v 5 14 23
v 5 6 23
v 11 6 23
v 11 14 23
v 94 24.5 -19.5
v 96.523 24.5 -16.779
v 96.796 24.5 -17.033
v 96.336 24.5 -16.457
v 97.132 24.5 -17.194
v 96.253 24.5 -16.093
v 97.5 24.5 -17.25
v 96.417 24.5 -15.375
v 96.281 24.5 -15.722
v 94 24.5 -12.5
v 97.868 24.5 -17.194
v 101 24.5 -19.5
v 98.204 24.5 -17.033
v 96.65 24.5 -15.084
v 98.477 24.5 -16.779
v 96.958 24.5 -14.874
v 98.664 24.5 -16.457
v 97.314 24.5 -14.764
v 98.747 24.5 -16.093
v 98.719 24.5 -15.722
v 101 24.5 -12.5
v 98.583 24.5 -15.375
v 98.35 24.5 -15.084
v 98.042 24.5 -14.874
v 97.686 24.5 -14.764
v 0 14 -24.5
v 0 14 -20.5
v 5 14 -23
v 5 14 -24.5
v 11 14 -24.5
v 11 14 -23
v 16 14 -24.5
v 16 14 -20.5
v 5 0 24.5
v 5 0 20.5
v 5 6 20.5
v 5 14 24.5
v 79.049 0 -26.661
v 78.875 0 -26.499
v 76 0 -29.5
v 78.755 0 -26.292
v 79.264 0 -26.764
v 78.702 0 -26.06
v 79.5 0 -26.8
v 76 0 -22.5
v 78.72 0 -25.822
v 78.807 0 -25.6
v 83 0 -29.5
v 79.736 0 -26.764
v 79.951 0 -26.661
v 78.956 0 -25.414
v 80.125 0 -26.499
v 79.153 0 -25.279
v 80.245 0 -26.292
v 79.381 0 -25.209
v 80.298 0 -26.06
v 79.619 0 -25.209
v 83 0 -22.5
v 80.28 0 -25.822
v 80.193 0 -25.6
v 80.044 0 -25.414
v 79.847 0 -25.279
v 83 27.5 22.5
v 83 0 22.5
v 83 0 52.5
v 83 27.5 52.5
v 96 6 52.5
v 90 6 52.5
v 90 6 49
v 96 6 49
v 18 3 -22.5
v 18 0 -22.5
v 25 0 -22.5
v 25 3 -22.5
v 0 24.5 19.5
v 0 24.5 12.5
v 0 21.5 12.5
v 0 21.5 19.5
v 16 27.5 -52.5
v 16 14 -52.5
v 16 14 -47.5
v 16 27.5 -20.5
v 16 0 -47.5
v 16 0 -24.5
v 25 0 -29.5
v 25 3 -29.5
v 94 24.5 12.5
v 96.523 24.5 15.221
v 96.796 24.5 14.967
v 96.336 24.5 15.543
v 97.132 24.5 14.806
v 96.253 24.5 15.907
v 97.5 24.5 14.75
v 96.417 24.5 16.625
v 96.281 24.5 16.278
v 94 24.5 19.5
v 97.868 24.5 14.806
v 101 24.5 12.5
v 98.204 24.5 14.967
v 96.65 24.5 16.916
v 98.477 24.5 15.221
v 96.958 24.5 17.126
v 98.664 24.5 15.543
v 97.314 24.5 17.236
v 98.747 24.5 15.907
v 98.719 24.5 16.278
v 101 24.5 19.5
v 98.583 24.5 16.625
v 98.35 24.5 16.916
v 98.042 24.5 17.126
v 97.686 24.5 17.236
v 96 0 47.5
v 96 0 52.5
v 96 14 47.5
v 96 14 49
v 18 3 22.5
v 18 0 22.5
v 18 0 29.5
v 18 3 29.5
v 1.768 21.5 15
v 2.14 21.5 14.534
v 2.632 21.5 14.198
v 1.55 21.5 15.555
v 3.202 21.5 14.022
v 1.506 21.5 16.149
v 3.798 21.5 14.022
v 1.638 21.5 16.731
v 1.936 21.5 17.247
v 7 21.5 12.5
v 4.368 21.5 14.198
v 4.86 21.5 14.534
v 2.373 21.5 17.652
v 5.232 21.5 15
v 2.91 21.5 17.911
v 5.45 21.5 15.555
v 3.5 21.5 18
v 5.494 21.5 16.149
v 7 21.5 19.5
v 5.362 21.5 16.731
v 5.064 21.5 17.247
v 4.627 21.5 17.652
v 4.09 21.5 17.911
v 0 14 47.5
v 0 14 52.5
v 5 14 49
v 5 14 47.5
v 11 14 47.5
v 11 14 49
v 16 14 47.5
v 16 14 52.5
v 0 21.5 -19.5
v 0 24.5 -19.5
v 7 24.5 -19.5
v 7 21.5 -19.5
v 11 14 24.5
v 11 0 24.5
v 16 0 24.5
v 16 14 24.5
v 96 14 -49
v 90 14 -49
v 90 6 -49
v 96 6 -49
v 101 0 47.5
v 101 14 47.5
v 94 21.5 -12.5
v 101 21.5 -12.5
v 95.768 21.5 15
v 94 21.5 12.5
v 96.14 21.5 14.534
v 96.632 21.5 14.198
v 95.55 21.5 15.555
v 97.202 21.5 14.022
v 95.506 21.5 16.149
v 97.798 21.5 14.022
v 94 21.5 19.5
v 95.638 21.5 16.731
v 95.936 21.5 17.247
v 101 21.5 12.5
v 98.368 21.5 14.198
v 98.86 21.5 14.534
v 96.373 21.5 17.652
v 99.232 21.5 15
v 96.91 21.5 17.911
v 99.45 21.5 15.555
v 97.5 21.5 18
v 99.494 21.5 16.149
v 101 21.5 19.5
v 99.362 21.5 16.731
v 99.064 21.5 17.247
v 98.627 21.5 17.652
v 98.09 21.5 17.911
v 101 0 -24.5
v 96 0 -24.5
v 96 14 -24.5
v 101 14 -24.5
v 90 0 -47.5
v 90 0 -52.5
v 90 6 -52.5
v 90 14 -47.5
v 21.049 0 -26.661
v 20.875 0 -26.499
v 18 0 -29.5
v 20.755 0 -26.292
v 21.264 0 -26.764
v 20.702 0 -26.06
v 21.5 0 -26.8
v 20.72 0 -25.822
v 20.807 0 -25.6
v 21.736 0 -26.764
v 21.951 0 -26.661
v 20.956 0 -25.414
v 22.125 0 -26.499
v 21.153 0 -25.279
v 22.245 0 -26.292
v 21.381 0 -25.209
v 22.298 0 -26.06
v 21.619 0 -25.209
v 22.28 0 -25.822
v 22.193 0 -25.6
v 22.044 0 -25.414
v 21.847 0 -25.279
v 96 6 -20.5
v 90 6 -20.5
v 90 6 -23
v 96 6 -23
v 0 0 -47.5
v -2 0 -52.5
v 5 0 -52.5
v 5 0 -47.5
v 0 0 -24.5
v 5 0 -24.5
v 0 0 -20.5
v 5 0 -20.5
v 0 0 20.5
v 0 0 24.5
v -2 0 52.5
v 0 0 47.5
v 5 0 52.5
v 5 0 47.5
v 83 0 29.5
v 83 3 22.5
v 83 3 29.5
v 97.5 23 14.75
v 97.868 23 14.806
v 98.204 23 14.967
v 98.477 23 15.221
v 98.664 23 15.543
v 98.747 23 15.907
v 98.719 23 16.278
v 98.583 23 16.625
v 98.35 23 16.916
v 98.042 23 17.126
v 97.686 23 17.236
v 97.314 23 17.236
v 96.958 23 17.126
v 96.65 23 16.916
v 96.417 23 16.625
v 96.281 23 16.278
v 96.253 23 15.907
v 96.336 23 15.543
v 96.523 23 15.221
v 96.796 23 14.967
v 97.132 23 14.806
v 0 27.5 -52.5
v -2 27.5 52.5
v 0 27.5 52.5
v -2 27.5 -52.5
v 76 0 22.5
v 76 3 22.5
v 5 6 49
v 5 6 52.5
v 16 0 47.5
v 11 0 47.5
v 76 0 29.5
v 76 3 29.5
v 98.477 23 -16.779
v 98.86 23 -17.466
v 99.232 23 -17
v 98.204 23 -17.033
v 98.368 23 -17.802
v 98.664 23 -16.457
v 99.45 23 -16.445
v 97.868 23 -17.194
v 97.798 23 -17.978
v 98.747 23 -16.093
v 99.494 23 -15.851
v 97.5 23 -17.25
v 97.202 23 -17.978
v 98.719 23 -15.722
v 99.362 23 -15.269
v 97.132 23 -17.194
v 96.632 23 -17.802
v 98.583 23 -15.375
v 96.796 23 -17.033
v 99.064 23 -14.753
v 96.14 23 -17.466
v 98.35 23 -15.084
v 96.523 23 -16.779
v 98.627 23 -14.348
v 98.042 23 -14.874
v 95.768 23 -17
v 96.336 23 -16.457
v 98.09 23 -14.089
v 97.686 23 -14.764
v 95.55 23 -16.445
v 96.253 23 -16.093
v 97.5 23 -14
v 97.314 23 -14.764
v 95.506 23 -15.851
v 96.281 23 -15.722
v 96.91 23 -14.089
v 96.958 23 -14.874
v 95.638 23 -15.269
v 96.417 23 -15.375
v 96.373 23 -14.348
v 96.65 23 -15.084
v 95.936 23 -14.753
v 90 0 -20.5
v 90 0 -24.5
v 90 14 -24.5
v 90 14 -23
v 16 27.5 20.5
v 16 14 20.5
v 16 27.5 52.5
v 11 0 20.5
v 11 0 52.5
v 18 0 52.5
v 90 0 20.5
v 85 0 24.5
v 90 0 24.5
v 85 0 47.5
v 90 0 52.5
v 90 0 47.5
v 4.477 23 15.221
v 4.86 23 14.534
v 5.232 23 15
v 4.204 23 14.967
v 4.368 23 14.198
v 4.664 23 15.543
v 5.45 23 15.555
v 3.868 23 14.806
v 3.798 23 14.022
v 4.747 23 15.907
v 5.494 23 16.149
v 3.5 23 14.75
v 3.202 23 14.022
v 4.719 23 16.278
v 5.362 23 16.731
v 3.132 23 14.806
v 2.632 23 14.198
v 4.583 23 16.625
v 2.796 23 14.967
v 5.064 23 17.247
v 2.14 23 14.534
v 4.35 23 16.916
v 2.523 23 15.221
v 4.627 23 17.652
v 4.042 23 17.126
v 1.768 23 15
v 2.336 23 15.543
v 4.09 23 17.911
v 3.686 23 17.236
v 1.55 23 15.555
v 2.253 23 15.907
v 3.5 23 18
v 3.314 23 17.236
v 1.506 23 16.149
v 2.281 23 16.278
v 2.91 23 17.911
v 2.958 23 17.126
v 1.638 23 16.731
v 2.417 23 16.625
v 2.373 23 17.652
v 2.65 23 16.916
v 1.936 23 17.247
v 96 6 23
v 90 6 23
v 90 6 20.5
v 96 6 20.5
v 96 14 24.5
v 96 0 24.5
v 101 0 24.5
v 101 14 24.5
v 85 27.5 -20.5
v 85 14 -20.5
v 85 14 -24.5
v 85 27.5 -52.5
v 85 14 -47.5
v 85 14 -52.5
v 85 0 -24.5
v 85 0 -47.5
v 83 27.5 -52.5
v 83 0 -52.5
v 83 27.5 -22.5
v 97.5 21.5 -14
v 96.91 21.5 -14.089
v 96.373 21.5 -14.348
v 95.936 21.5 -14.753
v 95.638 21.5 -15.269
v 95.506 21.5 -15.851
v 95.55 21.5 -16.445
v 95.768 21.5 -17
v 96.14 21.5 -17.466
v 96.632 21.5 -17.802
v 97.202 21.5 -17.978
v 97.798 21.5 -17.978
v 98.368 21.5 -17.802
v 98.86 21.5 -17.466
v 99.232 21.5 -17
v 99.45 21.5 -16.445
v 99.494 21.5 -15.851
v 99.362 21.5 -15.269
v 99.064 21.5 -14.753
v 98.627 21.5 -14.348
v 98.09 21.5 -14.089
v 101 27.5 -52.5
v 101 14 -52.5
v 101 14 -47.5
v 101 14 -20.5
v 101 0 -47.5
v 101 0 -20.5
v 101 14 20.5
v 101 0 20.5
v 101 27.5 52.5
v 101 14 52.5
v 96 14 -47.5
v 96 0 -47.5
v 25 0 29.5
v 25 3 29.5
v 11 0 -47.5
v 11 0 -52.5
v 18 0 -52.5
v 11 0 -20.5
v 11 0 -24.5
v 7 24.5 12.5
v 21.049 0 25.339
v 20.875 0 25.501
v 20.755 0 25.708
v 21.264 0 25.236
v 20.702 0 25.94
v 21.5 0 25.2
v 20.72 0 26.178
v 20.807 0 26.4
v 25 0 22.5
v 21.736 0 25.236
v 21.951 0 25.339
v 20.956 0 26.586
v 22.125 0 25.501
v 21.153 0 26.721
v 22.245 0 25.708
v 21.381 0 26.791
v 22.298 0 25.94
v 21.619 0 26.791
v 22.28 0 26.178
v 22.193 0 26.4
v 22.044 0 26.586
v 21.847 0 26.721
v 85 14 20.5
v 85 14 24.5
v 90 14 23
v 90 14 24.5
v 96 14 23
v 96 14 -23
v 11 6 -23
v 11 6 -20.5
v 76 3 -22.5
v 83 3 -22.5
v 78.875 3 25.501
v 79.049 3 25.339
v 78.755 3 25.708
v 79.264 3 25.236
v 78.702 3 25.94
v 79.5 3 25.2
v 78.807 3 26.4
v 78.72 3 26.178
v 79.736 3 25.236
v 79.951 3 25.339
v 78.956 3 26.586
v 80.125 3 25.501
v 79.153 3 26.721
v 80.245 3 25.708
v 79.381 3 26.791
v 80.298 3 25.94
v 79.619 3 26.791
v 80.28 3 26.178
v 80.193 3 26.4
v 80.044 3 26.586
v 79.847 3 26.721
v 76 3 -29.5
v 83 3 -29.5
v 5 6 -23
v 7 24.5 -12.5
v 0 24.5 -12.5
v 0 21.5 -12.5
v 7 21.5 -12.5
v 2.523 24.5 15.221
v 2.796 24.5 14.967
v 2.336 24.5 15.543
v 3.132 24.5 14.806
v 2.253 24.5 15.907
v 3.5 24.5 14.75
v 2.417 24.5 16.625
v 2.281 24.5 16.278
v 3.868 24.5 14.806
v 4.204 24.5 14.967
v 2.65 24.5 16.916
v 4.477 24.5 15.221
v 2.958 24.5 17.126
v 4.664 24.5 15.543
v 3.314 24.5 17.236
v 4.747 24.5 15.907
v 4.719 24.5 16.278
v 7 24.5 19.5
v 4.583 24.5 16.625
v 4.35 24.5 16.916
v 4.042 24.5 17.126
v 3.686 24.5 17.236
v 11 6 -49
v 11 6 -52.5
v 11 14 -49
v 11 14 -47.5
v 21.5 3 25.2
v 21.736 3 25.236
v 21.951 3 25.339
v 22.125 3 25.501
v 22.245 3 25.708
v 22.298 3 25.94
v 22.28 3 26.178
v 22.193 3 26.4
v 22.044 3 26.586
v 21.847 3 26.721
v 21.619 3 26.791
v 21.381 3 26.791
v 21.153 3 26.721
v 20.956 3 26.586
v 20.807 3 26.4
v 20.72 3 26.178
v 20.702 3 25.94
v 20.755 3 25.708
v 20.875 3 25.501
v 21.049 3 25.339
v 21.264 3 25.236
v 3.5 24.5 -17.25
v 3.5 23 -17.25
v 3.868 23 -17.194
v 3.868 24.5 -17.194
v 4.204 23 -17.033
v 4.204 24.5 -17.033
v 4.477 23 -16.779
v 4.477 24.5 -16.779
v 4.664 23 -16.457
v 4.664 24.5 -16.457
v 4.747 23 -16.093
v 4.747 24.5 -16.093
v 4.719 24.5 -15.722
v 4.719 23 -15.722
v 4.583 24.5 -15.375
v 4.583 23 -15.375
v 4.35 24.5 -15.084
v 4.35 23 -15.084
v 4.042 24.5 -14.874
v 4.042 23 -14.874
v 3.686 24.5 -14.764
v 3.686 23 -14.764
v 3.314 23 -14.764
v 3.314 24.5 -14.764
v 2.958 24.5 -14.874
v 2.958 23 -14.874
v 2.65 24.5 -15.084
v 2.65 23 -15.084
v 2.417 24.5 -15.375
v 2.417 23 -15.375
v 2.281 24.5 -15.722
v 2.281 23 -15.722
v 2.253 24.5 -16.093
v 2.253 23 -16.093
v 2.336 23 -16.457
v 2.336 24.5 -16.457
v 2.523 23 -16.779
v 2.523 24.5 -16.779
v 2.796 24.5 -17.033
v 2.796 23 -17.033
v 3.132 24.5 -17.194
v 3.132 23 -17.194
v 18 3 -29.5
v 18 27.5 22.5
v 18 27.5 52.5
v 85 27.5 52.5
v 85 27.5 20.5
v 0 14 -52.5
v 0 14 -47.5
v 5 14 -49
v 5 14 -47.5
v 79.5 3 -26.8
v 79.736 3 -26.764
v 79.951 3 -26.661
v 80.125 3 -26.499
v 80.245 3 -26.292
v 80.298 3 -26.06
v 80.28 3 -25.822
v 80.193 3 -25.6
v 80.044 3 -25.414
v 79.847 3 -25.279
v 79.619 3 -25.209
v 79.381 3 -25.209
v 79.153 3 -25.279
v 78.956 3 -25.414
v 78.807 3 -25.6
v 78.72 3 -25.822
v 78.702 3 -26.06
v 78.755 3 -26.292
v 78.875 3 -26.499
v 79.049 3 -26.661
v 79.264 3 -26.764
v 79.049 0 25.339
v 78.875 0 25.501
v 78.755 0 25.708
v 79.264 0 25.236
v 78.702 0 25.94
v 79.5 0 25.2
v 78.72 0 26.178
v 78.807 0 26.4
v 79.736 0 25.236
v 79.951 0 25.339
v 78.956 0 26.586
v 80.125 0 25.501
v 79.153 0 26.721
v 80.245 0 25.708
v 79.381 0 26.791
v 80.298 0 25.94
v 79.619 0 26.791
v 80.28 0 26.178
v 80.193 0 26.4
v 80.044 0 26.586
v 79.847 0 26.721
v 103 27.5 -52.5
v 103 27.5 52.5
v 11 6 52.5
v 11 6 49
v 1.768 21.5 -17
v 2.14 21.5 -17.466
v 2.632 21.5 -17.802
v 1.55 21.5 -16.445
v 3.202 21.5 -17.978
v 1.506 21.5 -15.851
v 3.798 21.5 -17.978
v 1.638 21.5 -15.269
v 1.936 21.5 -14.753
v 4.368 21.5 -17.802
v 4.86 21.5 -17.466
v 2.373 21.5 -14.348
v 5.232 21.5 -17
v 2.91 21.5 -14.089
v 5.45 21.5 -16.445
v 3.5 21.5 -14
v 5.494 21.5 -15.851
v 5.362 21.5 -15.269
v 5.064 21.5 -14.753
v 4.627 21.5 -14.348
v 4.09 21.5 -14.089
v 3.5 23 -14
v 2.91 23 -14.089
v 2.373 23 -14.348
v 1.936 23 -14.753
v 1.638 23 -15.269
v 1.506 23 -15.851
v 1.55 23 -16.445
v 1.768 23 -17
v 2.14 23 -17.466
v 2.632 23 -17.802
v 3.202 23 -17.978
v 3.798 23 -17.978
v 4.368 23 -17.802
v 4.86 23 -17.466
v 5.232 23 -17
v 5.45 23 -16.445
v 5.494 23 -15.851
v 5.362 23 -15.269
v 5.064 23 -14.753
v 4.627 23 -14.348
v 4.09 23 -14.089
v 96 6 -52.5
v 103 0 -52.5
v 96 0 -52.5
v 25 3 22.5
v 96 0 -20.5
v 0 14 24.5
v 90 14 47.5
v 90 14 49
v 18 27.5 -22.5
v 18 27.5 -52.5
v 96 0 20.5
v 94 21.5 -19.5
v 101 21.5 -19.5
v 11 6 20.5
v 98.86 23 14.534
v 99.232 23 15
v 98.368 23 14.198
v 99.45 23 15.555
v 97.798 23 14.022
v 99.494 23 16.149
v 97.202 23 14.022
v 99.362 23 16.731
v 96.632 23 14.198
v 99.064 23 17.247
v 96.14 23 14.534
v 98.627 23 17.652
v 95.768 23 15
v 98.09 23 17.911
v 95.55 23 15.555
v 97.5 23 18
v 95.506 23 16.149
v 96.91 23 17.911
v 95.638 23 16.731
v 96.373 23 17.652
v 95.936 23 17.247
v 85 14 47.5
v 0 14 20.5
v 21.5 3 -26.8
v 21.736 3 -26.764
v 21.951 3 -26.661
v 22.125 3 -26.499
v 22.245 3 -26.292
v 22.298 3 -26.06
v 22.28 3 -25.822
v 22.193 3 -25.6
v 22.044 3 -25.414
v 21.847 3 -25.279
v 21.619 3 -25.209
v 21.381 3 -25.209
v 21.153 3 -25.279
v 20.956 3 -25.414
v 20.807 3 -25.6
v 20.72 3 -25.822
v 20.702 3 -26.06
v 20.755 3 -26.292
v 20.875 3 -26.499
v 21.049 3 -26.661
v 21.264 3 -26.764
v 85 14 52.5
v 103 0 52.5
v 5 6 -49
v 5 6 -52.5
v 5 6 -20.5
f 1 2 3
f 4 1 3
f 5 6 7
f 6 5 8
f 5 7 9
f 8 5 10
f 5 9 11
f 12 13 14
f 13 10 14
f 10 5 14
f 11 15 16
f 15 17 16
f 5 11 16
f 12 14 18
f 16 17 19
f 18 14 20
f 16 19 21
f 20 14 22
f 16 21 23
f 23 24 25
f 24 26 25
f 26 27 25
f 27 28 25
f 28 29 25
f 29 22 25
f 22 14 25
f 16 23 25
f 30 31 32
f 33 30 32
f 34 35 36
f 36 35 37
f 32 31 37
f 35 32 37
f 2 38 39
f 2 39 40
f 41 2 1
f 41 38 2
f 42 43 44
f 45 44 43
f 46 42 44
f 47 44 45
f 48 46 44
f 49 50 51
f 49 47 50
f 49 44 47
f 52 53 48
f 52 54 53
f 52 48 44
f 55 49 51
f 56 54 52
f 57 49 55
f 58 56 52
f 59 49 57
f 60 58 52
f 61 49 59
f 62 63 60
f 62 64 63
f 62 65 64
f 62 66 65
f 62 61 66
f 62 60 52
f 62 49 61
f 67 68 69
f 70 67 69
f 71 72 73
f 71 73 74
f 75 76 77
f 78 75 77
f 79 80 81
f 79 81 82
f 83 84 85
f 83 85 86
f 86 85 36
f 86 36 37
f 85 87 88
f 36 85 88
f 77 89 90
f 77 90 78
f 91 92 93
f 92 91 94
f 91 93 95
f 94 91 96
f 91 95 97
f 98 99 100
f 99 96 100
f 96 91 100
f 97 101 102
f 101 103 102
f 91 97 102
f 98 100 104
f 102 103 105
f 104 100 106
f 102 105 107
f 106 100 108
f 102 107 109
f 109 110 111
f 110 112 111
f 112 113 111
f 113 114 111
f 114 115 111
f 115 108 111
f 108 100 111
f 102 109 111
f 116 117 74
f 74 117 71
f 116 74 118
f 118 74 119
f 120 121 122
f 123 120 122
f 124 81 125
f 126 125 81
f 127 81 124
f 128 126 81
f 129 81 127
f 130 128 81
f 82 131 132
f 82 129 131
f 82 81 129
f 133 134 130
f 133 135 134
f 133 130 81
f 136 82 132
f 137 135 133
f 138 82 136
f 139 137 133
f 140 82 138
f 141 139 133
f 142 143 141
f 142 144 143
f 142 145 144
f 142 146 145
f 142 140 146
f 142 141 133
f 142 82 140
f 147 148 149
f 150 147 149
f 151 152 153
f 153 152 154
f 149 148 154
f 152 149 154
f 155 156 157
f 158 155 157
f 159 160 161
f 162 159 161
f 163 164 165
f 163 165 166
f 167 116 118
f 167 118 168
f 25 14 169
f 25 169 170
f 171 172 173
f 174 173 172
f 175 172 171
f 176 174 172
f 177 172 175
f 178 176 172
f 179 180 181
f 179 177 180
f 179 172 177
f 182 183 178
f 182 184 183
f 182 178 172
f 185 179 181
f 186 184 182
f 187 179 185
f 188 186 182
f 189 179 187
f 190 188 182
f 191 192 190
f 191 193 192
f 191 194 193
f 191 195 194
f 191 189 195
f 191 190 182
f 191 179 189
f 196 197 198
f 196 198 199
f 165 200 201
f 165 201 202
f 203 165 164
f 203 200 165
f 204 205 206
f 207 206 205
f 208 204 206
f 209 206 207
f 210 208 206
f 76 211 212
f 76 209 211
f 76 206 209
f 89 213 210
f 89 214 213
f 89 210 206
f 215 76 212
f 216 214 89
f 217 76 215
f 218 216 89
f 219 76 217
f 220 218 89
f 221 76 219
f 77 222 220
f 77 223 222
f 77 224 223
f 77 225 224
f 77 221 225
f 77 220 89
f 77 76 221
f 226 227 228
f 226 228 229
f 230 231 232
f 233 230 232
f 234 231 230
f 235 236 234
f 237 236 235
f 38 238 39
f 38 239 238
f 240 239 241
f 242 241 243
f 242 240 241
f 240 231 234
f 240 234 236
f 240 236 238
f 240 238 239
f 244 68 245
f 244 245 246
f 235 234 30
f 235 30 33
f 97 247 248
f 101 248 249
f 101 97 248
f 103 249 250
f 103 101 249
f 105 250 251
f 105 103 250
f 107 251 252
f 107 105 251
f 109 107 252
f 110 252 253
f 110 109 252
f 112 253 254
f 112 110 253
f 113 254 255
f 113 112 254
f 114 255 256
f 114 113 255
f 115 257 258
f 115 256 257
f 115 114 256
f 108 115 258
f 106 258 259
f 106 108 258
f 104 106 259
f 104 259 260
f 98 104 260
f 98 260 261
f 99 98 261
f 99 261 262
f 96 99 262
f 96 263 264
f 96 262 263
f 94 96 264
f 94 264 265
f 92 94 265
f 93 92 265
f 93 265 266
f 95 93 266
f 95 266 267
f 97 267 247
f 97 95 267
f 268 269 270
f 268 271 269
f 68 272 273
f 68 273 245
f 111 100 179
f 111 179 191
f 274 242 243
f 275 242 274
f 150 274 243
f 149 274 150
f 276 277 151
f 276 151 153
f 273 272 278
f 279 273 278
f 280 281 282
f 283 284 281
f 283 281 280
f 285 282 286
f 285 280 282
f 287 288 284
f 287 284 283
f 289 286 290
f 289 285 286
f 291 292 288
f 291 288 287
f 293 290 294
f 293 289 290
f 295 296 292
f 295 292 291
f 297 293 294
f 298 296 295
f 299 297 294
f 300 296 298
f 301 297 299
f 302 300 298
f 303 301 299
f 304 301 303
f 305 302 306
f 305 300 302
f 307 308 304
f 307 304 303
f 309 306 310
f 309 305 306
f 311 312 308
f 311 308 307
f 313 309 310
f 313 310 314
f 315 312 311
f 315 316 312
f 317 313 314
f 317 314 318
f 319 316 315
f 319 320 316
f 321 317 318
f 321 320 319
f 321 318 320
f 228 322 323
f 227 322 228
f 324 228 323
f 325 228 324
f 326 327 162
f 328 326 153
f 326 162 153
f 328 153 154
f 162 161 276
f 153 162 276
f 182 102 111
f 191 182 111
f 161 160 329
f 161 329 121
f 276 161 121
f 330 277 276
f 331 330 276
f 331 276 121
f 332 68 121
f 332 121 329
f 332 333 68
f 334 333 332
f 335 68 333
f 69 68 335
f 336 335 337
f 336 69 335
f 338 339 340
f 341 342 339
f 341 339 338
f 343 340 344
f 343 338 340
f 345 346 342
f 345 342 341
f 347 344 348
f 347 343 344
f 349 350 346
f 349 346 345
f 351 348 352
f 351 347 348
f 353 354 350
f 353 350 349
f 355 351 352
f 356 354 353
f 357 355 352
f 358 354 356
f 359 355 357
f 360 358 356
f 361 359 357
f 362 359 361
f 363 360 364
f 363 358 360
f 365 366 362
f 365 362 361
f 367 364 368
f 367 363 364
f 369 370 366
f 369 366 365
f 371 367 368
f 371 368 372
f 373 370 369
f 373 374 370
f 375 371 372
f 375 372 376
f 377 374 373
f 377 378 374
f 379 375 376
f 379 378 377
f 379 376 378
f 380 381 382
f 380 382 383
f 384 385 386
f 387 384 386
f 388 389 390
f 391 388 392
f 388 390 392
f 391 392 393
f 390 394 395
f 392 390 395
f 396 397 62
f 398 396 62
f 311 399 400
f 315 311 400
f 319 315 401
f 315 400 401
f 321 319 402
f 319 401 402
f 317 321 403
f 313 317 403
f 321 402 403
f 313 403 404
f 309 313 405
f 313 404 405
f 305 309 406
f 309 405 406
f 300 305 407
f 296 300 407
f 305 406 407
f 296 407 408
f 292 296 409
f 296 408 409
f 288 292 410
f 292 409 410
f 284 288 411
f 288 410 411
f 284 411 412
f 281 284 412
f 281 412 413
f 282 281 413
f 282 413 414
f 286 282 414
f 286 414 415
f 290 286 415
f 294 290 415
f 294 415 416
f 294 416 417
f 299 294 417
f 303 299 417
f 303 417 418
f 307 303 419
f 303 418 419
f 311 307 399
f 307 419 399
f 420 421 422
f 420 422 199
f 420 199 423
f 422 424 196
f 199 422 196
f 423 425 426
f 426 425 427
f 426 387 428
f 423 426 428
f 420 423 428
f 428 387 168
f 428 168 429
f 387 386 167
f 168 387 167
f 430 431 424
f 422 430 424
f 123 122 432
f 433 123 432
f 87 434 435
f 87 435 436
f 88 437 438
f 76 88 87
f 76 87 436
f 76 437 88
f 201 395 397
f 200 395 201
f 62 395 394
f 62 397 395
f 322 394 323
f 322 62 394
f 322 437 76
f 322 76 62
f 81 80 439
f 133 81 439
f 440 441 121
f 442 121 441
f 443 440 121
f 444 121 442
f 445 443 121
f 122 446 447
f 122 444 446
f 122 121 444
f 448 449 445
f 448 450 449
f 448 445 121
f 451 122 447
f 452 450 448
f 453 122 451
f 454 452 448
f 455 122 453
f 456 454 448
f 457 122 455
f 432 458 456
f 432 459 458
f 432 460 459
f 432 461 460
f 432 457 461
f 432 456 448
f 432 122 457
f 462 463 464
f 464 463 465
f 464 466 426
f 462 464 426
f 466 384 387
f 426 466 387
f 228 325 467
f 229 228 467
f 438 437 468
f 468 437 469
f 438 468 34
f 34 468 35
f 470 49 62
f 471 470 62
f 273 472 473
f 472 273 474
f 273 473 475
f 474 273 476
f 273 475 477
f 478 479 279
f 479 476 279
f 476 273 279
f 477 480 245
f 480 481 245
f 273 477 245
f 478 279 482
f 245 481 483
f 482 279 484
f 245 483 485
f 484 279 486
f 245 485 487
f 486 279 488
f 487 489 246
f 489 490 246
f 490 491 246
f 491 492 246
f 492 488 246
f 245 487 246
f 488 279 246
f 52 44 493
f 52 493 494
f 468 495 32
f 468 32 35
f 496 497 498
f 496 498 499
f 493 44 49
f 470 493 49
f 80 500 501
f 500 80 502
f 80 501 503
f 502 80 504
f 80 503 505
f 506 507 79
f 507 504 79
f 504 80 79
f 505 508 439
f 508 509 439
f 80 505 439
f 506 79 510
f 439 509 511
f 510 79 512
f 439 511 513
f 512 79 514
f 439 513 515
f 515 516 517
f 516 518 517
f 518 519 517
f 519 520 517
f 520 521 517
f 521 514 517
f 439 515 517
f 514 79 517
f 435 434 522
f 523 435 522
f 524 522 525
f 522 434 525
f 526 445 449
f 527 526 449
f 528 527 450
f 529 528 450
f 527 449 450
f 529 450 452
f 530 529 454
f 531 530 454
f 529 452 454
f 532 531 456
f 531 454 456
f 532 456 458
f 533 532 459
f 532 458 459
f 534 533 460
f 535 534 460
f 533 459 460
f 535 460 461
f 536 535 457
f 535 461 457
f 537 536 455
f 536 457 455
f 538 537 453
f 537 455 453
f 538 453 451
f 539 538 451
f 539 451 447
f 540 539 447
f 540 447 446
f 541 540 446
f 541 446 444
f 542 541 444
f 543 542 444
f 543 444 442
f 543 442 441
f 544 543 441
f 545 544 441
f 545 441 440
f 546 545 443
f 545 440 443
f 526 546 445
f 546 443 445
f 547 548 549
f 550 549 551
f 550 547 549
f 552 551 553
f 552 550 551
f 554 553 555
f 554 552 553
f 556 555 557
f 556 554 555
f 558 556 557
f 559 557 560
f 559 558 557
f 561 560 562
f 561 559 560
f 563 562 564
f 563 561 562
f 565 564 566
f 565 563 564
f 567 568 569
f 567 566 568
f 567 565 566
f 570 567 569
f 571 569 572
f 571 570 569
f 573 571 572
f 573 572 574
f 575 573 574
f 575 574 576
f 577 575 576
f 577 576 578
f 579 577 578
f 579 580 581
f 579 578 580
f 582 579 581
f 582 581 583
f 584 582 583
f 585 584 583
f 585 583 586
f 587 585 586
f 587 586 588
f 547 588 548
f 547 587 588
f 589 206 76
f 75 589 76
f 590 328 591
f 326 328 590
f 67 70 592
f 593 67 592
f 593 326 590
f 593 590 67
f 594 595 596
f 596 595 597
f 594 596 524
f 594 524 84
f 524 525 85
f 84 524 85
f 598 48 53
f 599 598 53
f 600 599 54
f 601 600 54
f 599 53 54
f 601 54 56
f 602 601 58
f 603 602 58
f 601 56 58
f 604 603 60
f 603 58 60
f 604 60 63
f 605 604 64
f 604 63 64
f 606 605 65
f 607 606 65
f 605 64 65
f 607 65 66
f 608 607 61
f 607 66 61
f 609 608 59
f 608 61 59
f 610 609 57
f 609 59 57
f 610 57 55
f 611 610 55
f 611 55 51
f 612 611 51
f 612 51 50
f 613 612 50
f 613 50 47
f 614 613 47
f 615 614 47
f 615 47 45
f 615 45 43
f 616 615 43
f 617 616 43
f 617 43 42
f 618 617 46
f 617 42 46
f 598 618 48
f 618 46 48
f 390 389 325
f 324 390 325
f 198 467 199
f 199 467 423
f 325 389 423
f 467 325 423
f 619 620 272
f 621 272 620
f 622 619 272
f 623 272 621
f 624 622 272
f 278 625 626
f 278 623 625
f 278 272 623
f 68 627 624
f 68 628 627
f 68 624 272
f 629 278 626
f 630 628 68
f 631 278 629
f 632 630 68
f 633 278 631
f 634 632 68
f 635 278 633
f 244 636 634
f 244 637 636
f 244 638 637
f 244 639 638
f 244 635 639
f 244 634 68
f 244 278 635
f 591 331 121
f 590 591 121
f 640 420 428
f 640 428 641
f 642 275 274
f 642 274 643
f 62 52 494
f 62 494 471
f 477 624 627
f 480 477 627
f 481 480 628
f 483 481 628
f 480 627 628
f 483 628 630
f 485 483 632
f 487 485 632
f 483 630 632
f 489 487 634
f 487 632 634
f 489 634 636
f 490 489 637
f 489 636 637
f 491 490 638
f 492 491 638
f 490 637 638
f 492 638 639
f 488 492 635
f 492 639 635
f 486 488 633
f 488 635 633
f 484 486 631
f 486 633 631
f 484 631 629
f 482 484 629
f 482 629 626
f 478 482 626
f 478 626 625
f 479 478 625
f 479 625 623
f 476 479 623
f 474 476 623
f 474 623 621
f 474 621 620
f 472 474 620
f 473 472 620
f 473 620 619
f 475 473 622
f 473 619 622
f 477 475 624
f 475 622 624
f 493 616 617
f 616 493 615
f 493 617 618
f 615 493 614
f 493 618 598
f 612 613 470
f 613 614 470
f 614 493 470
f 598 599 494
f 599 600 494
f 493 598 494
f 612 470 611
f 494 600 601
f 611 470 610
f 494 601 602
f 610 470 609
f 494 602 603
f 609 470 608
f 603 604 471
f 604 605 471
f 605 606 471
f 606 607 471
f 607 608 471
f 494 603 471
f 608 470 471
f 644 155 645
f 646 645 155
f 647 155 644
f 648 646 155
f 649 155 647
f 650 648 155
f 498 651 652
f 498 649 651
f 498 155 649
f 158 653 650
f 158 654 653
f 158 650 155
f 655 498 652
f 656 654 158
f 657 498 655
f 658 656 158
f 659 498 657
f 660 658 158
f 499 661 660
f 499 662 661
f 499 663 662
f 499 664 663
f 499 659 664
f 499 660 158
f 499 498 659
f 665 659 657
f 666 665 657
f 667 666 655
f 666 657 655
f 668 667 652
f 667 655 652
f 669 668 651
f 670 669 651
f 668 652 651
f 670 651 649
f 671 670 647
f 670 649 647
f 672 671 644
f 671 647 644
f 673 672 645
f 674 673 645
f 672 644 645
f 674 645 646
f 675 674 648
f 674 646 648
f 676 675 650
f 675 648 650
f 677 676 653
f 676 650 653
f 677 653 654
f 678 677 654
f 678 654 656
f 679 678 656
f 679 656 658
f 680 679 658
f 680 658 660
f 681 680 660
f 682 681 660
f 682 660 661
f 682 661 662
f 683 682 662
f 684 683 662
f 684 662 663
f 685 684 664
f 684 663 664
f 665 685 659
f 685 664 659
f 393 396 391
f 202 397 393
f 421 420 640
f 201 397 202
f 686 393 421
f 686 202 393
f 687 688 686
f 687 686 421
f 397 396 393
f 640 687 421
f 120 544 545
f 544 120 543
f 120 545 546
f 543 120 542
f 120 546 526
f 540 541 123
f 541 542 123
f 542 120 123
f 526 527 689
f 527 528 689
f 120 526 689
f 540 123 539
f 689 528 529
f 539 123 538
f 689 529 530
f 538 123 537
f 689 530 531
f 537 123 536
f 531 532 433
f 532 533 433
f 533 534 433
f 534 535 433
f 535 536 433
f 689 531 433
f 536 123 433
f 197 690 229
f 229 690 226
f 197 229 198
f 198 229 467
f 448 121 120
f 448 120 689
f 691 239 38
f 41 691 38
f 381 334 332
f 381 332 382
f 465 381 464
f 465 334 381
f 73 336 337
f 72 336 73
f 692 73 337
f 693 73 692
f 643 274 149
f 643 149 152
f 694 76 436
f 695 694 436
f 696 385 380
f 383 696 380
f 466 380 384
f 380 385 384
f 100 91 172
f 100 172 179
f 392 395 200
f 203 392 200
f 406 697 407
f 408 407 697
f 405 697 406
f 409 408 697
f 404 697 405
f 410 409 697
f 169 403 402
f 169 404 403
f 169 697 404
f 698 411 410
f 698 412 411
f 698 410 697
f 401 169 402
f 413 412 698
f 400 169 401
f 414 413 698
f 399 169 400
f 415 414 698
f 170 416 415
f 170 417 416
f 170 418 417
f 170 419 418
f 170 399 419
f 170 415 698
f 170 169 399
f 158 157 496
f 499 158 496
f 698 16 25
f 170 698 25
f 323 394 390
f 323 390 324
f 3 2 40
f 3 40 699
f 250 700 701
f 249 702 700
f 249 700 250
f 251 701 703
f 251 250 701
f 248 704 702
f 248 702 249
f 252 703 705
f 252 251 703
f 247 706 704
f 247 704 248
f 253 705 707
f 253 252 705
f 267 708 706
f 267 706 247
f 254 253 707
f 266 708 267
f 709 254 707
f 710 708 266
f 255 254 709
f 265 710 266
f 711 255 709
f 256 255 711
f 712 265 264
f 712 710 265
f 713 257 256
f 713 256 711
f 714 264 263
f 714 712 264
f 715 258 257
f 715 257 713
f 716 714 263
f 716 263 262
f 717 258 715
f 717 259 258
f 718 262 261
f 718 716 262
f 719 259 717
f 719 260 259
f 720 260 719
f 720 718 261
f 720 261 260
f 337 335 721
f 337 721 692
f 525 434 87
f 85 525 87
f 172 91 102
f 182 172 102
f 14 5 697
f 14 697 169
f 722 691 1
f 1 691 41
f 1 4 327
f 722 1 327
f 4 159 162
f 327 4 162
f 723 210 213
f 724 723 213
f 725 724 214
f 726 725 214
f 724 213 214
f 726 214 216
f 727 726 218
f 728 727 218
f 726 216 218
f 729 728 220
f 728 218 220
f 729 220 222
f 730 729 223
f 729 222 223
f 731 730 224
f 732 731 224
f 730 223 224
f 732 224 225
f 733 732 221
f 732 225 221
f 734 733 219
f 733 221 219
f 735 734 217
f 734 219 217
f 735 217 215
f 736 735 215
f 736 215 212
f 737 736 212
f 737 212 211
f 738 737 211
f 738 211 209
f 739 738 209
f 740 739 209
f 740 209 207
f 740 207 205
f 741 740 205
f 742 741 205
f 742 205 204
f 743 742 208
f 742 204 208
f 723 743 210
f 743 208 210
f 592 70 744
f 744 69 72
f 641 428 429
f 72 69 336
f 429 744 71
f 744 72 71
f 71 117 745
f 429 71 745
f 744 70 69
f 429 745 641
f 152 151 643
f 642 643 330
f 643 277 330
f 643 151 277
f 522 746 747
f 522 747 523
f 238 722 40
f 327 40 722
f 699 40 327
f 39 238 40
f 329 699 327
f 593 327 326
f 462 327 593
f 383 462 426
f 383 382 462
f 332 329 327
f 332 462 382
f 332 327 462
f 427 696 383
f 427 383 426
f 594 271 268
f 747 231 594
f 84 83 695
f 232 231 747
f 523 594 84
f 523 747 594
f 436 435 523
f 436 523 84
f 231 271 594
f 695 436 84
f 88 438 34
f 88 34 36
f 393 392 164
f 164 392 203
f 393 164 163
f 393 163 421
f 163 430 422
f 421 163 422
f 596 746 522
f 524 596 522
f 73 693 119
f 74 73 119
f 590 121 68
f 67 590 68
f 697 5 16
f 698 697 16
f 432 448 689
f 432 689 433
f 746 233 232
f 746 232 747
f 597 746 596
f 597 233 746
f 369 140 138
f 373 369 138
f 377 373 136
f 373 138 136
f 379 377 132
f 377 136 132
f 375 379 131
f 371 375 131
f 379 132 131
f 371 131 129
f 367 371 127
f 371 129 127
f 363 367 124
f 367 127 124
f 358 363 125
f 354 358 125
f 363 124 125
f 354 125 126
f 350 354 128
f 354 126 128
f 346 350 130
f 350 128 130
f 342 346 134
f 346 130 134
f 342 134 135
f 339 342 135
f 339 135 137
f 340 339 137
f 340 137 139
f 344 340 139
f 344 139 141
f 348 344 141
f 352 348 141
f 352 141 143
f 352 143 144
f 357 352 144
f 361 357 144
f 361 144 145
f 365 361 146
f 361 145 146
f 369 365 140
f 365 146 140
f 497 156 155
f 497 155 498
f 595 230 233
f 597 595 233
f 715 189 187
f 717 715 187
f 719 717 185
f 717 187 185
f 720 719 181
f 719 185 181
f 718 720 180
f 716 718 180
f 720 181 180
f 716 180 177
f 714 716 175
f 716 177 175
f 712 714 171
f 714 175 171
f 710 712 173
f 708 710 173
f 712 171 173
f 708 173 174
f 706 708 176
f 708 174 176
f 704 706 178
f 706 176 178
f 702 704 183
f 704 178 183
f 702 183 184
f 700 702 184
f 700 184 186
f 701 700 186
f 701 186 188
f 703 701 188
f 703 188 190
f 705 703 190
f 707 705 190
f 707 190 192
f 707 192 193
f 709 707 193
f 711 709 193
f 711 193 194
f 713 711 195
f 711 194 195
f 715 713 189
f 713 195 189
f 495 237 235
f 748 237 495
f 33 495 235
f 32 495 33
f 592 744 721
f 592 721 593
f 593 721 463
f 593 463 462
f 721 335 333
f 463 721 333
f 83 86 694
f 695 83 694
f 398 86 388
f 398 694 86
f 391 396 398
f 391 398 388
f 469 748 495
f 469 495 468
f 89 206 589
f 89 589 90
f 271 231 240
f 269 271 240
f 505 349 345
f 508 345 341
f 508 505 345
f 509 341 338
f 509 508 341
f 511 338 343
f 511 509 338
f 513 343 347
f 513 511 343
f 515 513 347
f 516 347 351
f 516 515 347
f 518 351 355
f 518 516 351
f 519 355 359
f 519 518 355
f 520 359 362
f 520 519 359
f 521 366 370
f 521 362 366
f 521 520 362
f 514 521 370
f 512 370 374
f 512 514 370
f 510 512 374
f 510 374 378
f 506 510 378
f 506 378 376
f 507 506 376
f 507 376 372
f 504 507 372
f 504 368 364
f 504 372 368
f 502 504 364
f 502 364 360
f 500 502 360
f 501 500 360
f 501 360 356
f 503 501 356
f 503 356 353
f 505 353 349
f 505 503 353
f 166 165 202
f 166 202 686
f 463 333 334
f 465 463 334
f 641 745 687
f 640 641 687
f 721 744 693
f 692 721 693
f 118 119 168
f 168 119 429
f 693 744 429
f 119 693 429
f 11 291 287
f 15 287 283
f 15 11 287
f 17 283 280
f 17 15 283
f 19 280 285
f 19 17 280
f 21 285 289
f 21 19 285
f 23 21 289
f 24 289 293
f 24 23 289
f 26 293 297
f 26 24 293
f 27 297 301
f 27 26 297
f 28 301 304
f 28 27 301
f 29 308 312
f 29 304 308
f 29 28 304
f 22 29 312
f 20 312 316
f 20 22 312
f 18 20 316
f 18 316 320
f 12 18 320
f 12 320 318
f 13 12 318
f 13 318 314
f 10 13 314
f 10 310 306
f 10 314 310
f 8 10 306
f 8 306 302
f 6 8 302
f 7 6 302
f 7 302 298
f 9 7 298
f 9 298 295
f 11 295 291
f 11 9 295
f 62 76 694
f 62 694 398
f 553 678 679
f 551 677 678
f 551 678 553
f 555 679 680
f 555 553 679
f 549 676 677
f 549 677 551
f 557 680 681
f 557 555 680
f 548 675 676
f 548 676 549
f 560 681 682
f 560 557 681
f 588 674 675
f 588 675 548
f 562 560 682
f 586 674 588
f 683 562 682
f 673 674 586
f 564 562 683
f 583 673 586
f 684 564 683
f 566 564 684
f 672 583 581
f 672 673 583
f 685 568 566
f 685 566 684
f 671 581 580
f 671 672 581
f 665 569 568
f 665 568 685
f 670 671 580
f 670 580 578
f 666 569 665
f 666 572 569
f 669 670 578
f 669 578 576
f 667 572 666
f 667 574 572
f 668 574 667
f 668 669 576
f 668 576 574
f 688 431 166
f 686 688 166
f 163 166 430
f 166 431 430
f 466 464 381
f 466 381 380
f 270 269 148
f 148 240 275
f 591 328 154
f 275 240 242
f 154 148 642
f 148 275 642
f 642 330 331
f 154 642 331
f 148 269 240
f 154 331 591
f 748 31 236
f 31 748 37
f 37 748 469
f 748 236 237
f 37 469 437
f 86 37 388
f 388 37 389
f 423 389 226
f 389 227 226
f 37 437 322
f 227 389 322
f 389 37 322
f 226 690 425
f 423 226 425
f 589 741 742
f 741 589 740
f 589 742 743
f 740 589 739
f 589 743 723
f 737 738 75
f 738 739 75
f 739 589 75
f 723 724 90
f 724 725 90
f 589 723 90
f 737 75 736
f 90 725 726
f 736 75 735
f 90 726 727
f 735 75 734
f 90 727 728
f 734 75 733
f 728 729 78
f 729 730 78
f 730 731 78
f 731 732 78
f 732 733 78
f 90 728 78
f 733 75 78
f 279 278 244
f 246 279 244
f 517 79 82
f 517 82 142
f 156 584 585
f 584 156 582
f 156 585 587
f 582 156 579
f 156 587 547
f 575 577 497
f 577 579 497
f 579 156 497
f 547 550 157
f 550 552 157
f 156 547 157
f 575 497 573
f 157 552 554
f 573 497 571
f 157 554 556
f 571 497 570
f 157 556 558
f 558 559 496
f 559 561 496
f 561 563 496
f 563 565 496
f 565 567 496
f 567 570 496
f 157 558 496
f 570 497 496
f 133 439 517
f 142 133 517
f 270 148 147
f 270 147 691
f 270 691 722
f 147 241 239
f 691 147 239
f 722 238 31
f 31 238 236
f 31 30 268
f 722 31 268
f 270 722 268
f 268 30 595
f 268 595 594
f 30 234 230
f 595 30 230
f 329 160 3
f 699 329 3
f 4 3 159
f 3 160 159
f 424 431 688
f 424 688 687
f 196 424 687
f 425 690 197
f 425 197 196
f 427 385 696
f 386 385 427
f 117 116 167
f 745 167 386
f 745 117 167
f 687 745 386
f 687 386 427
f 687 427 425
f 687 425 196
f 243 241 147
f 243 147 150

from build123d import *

# Parameters (mm, degrees)
SKETCH_1_W          = 65
SKETCH_1_H          = 2
EXTRUDE_2_DEPTH     = 27.5
SKETCH_2_W          = 16
SKETCH_2_H          = 5
SKETCH_2_H_2        = 4
EXTRUDE_3_DEPTH     = 14
SKETCH_2_3_W        = 105
SKETCH_2_3_H        = 2
CUT_EXTRUDE_1_DEPTH = 120.73094838
EXTRUDE_START       = -24.5
SKETCH_3_W          = 7
SKETCH_3_H          = 7
SKETCH_3_R          = 1.25
EXTRUDE_4_DEPTH     = 3
EXTRUDE_4_2_DEPTH   = 3
EXTRUDE_4_3_DEPTH   = 3
EXTRUDE_4_4_DEPTH   = 3
CUT_EXTRUDE_START   = -21.5
SKETCH_3_4_R        = 2
CUT_EXTRUDE_3_DEPTH = 1.5
SKETCH_4_W          = 7
SKETCH_4_H          = 7
SKETCH_4_R          = 0.8
EXTRUDE_5_DEPTH     = 3
EXTRUDE_5_2_DEPTH   = 3
EXTRUDE_5_3_DEPTH   = 3
EXTRUDE_5_4_DEPTH   = 3
SKETCH_5_W          = 6
SKETCH_5_H          = 6
CUT_EXTRUDE_4_DEPTH = 150.633719462
SKETCH_6_W          = 6
SKETCH_6_H          = 1.5
CUT_EXTRUDE_5_DEPTH = 118.590390764


with BuildPart() as part:
    # 草图1 → 凸台-拉伸2 (new body)
    with BuildSketch(Plane(origin=(0, 0, 0), x_dir=(1, 0, 0), z_dir=(0, 1, 0))):
        Polygon((0, 52.5), (-2, 52.5), (-2, -52.5), (0, -52.5), (0, -20.5), (0, 20.5), align=None)
        Polygon((-2, 52.5), (0, 52.5), (16, 52.5), (18, 52.5), (18, 54.5), (-2, 54.5), align=None)
        Polygon((16, 52.5), (16, 20.5), (18, 20.5), (18, 22.5), (18, 52.5), align=None)
        with Locations((50.5, 21.5)):
            Rectangle(SKETCH_1_W, SKETCH_1_H)
        Polygon((83, 22.5), (83, 20.5), (85, 20.5), (85, 52.5), (83, 52.5), align=None)
        Polygon((83, 52.5), (85, 52.5), (101, 52.5), (103, 52.5), (103, 54.5), (83, 54.5), align=None)
        Polygon((103, 52.5), (103, -52.5), (101, -52.5), (101, -20.5), (101, 20.5), (101, 52.5), align=None)
        Polygon((101, -52.5), (85, -52.5), (83, -52.5), (83, -54.5), (103, -54.5), (103, -52.5), align=None)
        Polygon((85, -20.5), (83, -20.5), (83, -22.5), (83, -52.5), (85, -52.5), align=None)
        with Locations((50.5, -21.5)):
            Rectangle(SKETCH_1_W, SKETCH_1_H)
        Polygon((18, -20.5), (16, -20.5), (16, -52.5), (18, -52.5), (18, -22.5), align=None)
        Polygon((16, -52.5), (0, -52.5), (-2, -52.5), (-2, -54.5), (18, -54.5), (18, -52.5), align=None)
    extrude(amount=EXTRUDE_2_DEPTH)

    # 草图2 → 凸台-拉伸3 (add)
    with BuildSketch(Plane.XZ):
        with Locations((8, 50)):
            Rectangle(SKETCH_2_W, SKETCH_2_H)
        with Locations((93, 50)):
            Rectangle(SKETCH_2_W, SKETCH_2_H)
        with Locations((8, -50)):
            Rectangle(SKETCH_2_W, SKETCH_2_H)
        with Locations((93, -50)):
            Rectangle(SKETCH_2_W, SKETCH_2_H)
        with Locations((8, 22.5)):
            Rectangle(SKETCH_2_W, SKETCH_2_H_2)
        with Locations((93, 22.5)):
            Rectangle(SKETCH_2_W, SKETCH_2_H_2)
        with Locations((93, -22.5)):
            Rectangle(SKETCH_2_W, SKETCH_2_H_2)
        with Locations((8, -22.5)):
            Rectangle(SKETCH_2_W, SKETCH_2_H_2)
    extrude(amount=-EXTRUDE_3_DEPTH)

    # 草图2<3> → 切除-拉伸1 (cut, through all)
    with BuildSketch(Plane.XZ):
        with Locations((50.5, 53.5)):
            Rectangle(SKETCH_2_3_W, SKETCH_2_3_H)
        with Locations((50.5, -53.5)):
            Rectangle(SKETCH_2_3_W, SKETCH_2_3_H)
    extrude(amount=-CUT_EXTRUDE_1_DEPTH, mode=Mode.SUBTRACT)

    # 草图5 → 切除-拉伸4 (cut, through all)
    with BuildSketch(Plane.XY.offset(52.5)):
        with Locations((8, 3)):
            Rectangle(SKETCH_5_W, SKETCH_5_H)
        with Locations((93, 3)):
            Rectangle(SKETCH_5_W, SKETCH_5_H)
    extrude(amount=-CUT_EXTRUDE_4_DEPTH, mode=Mode.SUBTRACT)

    # 草图6 → 切除-拉伸5 (cut, through all)
    with BuildSketch(Plane.XZ.offset(-6)):
        with Locations((8, 48.25)):
            Rectangle(SKETCH_6_W, SKETCH_6_H)
        with Locations((8, 23.75)):
            Rectangle(SKETCH_6_W, SKETCH_6_H)
        with Locations((93, 23.75)):
            Rectangle(SKETCH_6_W, SKETCH_6_H)
        with Locations((93, 48.25)):
            Rectangle(SKETCH_6_W, SKETCH_6_H)
        with Locations((93, -23.75)):
            Rectangle(SKETCH_6_W, SKETCH_6_H)
        with Locations((93, -48.25)):
            Rectangle(SKETCH_6_W, SKETCH_6_H)
        with Locations((8, -48.25)):
            Rectangle(SKETCH_6_W, SKETCH_6_H)
        with Locations((8, -23.75)):
            Rectangle(SKETCH_6_W, SKETCH_6_H)
    extrude(amount=-CUT_EXTRUDE_5_DEPTH, mode=Mode.SUBTRACT)


with BuildPart() as body_2:
    # 草图3 → 凸台-拉伸4 (new body)
    with BuildSketch(Plane.XZ.offset(EXTRUDE_START)):
        with Locations((3.5, 16)):
            Rectangle(SKETCH_3_W, SKETCH_3_H)
        with Locations(Location((3.5, 16, 0), (0, 0, 270))):
            Circle(SKETCH_3_R, mode=Mode.SUBTRACT)
    extrude(amount=EXTRUDE_4_DEPTH)


with BuildPart() as body_3:
    # 草图3 → Extrude 4 2 (new body)
    with BuildSketch(Plane.XZ.offset(EXTRUDE_START)):
        with Locations((3.5, -16)):
            Rectangle(SKETCH_3_W, SKETCH_3_H)
        with Locations(Location((3.5, -16, 0), (0, 0, 270))):
            Circle(SKETCH_3_R, mode=Mode.SUBTRACT)
    extrude(amount=EXTRUDE_4_2_DEPTH)


with BuildPart() as body_4:
    # 草图3 → Extrude 4 3 (new body)
    with BuildSketch(Plane.XZ.offset(EXTRUDE_START)):
        with Locations((97.5, 16)):
            Rectangle(SKETCH_3_W, SKETCH_3_H)
        with Locations(Location((97.5, 16, 0), (0, 0, 270))):
            Circle(SKETCH_3_R, mode=Mode.SUBTRACT)
    extrude(amount=EXTRUDE_4_3_DEPTH)


with BuildPart() as body_5:
    # 草图3 → Extrude 4 4 (new body)
    with BuildSketch(Plane.XZ.offset(EXTRUDE_START)):
        with Locations((97.5, -16)):
            Rectangle(SKETCH_3_W, SKETCH_3_H)
        with Locations(Location((97.5, -16, 0), (0, 0, 270))):
            Circle(SKETCH_3_R, mode=Mode.SUBTRACT)
    extrude(amount=EXTRUDE_4_4_DEPTH)


with BuildPart() as cut_extrude_3_tool:
    # 草图3<4> → 切除-拉伸3 (new body)
    with BuildSketch(Plane.XZ.offset(CUT_EXTRUDE_START)):
        with Locations(Location((3.5, 16, 0), (0, 0, 90))):
            Circle(SKETCH_3_4_R)
        with Locations(Location((97.5, 16, 0), (0, 0, 90))):
            Circle(SKETCH_3_4_R)
        with Locations(Location((97.5, -16, 0), (0, 0, 90))):
            Circle(SKETCH_3_4_R)
        with Locations(Location((3.5, -16, 0), (0, 0, 90))):
            Circle(SKETCH_3_4_R)
    extrude(amount=-CUT_EXTRUDE_3_DEPTH)


with BuildPart() as body_2_1:
    add(body_2.part)

    # 切除-拉伸3: cut by cut_extrude_3_tool
    add(cut_extrude_3_tool.part, mode=Mode.SUBTRACT)


with BuildPart() as body_3_1:
    add(body_3.part)

    # 切除-拉伸3: cut by cut_extrude_3_tool
    add(cut_extrude_3_tool.part, mode=Mode.SUBTRACT)


with BuildPart() as body_4_1:
    add(body_4.part)

    # 切除-拉伸3: cut by cut_extrude_3_tool
    add(cut_extrude_3_tool.part, mode=Mode.SUBTRACT)


with BuildPart() as body_5_1:
    add(body_5.part)

    # 切除-拉伸3: cut by cut_extrude_3_tool
    add(cut_extrude_3_tool.part, mode=Mode.SUBTRACT)


with BuildPart() as body_6:
    # 草图4 → 凸台-拉伸5 (new body)
    with BuildSketch(Plane.XZ):
        with Locations((21.5, 26)):
            Rectangle(SKETCH_4_W, SKETCH_4_H)
        with Locations(Location((21.5, 26, 0), (0, 0, 270))):
            Circle(SKETCH_4_R, mode=Mode.SUBTRACT)
    extrude(amount=-EXTRUDE_5_DEPTH)


with BuildPart() as body_7:
    # 草图4 → Extrude 5 2 (new body)
    with BuildSketch(Plane.XZ):
        with Locations((79.5, 26)):
            Rectangle(SKETCH_4_W, SKETCH_4_H)
        with Locations(Location((79.5, 26, 0), (0, 0, 270))):
            Circle(SKETCH_4_R, mode=Mode.SUBTRACT)
    extrude(amount=-EXTRUDE_5_2_DEPTH)


with BuildPart() as body_8:
    # 草图4 → Extrude 5 3 (new body)
    with BuildSketch(Plane.XZ):
        with Locations((21.5, -26)):
            Rectangle(SKETCH_4_W, SKETCH_4_H)
        with Locations(Location((21.5, -26, 0), (0, 0, 270))):
            Circle(SKETCH_4_R, mode=Mode.SUBTRACT)
    extrude(amount=-EXTRUDE_5_3_DEPTH)


with BuildPart() as body_9:
    # 草图4 → Extrude 5 4 (new body)
    with BuildSketch(Plane.XZ):
        with Locations((79.5, -26)):
            Rectangle(SKETCH_4_W, SKETCH_4_H)
        with Locations(Location((79.5, -26, 0), (0, 0, 270))):
            Circle(SKETCH_4_R, mode=Mode.SUBTRACT)
    extrude(amount=-EXTRUDE_5_4_DEPTH)


solid = Compound([part.part, body_2_1.part, body_3_1.part, body_4_1.part, body_5_1.part, body_6.part, body_7.part, body_8.part, body_9.part])
